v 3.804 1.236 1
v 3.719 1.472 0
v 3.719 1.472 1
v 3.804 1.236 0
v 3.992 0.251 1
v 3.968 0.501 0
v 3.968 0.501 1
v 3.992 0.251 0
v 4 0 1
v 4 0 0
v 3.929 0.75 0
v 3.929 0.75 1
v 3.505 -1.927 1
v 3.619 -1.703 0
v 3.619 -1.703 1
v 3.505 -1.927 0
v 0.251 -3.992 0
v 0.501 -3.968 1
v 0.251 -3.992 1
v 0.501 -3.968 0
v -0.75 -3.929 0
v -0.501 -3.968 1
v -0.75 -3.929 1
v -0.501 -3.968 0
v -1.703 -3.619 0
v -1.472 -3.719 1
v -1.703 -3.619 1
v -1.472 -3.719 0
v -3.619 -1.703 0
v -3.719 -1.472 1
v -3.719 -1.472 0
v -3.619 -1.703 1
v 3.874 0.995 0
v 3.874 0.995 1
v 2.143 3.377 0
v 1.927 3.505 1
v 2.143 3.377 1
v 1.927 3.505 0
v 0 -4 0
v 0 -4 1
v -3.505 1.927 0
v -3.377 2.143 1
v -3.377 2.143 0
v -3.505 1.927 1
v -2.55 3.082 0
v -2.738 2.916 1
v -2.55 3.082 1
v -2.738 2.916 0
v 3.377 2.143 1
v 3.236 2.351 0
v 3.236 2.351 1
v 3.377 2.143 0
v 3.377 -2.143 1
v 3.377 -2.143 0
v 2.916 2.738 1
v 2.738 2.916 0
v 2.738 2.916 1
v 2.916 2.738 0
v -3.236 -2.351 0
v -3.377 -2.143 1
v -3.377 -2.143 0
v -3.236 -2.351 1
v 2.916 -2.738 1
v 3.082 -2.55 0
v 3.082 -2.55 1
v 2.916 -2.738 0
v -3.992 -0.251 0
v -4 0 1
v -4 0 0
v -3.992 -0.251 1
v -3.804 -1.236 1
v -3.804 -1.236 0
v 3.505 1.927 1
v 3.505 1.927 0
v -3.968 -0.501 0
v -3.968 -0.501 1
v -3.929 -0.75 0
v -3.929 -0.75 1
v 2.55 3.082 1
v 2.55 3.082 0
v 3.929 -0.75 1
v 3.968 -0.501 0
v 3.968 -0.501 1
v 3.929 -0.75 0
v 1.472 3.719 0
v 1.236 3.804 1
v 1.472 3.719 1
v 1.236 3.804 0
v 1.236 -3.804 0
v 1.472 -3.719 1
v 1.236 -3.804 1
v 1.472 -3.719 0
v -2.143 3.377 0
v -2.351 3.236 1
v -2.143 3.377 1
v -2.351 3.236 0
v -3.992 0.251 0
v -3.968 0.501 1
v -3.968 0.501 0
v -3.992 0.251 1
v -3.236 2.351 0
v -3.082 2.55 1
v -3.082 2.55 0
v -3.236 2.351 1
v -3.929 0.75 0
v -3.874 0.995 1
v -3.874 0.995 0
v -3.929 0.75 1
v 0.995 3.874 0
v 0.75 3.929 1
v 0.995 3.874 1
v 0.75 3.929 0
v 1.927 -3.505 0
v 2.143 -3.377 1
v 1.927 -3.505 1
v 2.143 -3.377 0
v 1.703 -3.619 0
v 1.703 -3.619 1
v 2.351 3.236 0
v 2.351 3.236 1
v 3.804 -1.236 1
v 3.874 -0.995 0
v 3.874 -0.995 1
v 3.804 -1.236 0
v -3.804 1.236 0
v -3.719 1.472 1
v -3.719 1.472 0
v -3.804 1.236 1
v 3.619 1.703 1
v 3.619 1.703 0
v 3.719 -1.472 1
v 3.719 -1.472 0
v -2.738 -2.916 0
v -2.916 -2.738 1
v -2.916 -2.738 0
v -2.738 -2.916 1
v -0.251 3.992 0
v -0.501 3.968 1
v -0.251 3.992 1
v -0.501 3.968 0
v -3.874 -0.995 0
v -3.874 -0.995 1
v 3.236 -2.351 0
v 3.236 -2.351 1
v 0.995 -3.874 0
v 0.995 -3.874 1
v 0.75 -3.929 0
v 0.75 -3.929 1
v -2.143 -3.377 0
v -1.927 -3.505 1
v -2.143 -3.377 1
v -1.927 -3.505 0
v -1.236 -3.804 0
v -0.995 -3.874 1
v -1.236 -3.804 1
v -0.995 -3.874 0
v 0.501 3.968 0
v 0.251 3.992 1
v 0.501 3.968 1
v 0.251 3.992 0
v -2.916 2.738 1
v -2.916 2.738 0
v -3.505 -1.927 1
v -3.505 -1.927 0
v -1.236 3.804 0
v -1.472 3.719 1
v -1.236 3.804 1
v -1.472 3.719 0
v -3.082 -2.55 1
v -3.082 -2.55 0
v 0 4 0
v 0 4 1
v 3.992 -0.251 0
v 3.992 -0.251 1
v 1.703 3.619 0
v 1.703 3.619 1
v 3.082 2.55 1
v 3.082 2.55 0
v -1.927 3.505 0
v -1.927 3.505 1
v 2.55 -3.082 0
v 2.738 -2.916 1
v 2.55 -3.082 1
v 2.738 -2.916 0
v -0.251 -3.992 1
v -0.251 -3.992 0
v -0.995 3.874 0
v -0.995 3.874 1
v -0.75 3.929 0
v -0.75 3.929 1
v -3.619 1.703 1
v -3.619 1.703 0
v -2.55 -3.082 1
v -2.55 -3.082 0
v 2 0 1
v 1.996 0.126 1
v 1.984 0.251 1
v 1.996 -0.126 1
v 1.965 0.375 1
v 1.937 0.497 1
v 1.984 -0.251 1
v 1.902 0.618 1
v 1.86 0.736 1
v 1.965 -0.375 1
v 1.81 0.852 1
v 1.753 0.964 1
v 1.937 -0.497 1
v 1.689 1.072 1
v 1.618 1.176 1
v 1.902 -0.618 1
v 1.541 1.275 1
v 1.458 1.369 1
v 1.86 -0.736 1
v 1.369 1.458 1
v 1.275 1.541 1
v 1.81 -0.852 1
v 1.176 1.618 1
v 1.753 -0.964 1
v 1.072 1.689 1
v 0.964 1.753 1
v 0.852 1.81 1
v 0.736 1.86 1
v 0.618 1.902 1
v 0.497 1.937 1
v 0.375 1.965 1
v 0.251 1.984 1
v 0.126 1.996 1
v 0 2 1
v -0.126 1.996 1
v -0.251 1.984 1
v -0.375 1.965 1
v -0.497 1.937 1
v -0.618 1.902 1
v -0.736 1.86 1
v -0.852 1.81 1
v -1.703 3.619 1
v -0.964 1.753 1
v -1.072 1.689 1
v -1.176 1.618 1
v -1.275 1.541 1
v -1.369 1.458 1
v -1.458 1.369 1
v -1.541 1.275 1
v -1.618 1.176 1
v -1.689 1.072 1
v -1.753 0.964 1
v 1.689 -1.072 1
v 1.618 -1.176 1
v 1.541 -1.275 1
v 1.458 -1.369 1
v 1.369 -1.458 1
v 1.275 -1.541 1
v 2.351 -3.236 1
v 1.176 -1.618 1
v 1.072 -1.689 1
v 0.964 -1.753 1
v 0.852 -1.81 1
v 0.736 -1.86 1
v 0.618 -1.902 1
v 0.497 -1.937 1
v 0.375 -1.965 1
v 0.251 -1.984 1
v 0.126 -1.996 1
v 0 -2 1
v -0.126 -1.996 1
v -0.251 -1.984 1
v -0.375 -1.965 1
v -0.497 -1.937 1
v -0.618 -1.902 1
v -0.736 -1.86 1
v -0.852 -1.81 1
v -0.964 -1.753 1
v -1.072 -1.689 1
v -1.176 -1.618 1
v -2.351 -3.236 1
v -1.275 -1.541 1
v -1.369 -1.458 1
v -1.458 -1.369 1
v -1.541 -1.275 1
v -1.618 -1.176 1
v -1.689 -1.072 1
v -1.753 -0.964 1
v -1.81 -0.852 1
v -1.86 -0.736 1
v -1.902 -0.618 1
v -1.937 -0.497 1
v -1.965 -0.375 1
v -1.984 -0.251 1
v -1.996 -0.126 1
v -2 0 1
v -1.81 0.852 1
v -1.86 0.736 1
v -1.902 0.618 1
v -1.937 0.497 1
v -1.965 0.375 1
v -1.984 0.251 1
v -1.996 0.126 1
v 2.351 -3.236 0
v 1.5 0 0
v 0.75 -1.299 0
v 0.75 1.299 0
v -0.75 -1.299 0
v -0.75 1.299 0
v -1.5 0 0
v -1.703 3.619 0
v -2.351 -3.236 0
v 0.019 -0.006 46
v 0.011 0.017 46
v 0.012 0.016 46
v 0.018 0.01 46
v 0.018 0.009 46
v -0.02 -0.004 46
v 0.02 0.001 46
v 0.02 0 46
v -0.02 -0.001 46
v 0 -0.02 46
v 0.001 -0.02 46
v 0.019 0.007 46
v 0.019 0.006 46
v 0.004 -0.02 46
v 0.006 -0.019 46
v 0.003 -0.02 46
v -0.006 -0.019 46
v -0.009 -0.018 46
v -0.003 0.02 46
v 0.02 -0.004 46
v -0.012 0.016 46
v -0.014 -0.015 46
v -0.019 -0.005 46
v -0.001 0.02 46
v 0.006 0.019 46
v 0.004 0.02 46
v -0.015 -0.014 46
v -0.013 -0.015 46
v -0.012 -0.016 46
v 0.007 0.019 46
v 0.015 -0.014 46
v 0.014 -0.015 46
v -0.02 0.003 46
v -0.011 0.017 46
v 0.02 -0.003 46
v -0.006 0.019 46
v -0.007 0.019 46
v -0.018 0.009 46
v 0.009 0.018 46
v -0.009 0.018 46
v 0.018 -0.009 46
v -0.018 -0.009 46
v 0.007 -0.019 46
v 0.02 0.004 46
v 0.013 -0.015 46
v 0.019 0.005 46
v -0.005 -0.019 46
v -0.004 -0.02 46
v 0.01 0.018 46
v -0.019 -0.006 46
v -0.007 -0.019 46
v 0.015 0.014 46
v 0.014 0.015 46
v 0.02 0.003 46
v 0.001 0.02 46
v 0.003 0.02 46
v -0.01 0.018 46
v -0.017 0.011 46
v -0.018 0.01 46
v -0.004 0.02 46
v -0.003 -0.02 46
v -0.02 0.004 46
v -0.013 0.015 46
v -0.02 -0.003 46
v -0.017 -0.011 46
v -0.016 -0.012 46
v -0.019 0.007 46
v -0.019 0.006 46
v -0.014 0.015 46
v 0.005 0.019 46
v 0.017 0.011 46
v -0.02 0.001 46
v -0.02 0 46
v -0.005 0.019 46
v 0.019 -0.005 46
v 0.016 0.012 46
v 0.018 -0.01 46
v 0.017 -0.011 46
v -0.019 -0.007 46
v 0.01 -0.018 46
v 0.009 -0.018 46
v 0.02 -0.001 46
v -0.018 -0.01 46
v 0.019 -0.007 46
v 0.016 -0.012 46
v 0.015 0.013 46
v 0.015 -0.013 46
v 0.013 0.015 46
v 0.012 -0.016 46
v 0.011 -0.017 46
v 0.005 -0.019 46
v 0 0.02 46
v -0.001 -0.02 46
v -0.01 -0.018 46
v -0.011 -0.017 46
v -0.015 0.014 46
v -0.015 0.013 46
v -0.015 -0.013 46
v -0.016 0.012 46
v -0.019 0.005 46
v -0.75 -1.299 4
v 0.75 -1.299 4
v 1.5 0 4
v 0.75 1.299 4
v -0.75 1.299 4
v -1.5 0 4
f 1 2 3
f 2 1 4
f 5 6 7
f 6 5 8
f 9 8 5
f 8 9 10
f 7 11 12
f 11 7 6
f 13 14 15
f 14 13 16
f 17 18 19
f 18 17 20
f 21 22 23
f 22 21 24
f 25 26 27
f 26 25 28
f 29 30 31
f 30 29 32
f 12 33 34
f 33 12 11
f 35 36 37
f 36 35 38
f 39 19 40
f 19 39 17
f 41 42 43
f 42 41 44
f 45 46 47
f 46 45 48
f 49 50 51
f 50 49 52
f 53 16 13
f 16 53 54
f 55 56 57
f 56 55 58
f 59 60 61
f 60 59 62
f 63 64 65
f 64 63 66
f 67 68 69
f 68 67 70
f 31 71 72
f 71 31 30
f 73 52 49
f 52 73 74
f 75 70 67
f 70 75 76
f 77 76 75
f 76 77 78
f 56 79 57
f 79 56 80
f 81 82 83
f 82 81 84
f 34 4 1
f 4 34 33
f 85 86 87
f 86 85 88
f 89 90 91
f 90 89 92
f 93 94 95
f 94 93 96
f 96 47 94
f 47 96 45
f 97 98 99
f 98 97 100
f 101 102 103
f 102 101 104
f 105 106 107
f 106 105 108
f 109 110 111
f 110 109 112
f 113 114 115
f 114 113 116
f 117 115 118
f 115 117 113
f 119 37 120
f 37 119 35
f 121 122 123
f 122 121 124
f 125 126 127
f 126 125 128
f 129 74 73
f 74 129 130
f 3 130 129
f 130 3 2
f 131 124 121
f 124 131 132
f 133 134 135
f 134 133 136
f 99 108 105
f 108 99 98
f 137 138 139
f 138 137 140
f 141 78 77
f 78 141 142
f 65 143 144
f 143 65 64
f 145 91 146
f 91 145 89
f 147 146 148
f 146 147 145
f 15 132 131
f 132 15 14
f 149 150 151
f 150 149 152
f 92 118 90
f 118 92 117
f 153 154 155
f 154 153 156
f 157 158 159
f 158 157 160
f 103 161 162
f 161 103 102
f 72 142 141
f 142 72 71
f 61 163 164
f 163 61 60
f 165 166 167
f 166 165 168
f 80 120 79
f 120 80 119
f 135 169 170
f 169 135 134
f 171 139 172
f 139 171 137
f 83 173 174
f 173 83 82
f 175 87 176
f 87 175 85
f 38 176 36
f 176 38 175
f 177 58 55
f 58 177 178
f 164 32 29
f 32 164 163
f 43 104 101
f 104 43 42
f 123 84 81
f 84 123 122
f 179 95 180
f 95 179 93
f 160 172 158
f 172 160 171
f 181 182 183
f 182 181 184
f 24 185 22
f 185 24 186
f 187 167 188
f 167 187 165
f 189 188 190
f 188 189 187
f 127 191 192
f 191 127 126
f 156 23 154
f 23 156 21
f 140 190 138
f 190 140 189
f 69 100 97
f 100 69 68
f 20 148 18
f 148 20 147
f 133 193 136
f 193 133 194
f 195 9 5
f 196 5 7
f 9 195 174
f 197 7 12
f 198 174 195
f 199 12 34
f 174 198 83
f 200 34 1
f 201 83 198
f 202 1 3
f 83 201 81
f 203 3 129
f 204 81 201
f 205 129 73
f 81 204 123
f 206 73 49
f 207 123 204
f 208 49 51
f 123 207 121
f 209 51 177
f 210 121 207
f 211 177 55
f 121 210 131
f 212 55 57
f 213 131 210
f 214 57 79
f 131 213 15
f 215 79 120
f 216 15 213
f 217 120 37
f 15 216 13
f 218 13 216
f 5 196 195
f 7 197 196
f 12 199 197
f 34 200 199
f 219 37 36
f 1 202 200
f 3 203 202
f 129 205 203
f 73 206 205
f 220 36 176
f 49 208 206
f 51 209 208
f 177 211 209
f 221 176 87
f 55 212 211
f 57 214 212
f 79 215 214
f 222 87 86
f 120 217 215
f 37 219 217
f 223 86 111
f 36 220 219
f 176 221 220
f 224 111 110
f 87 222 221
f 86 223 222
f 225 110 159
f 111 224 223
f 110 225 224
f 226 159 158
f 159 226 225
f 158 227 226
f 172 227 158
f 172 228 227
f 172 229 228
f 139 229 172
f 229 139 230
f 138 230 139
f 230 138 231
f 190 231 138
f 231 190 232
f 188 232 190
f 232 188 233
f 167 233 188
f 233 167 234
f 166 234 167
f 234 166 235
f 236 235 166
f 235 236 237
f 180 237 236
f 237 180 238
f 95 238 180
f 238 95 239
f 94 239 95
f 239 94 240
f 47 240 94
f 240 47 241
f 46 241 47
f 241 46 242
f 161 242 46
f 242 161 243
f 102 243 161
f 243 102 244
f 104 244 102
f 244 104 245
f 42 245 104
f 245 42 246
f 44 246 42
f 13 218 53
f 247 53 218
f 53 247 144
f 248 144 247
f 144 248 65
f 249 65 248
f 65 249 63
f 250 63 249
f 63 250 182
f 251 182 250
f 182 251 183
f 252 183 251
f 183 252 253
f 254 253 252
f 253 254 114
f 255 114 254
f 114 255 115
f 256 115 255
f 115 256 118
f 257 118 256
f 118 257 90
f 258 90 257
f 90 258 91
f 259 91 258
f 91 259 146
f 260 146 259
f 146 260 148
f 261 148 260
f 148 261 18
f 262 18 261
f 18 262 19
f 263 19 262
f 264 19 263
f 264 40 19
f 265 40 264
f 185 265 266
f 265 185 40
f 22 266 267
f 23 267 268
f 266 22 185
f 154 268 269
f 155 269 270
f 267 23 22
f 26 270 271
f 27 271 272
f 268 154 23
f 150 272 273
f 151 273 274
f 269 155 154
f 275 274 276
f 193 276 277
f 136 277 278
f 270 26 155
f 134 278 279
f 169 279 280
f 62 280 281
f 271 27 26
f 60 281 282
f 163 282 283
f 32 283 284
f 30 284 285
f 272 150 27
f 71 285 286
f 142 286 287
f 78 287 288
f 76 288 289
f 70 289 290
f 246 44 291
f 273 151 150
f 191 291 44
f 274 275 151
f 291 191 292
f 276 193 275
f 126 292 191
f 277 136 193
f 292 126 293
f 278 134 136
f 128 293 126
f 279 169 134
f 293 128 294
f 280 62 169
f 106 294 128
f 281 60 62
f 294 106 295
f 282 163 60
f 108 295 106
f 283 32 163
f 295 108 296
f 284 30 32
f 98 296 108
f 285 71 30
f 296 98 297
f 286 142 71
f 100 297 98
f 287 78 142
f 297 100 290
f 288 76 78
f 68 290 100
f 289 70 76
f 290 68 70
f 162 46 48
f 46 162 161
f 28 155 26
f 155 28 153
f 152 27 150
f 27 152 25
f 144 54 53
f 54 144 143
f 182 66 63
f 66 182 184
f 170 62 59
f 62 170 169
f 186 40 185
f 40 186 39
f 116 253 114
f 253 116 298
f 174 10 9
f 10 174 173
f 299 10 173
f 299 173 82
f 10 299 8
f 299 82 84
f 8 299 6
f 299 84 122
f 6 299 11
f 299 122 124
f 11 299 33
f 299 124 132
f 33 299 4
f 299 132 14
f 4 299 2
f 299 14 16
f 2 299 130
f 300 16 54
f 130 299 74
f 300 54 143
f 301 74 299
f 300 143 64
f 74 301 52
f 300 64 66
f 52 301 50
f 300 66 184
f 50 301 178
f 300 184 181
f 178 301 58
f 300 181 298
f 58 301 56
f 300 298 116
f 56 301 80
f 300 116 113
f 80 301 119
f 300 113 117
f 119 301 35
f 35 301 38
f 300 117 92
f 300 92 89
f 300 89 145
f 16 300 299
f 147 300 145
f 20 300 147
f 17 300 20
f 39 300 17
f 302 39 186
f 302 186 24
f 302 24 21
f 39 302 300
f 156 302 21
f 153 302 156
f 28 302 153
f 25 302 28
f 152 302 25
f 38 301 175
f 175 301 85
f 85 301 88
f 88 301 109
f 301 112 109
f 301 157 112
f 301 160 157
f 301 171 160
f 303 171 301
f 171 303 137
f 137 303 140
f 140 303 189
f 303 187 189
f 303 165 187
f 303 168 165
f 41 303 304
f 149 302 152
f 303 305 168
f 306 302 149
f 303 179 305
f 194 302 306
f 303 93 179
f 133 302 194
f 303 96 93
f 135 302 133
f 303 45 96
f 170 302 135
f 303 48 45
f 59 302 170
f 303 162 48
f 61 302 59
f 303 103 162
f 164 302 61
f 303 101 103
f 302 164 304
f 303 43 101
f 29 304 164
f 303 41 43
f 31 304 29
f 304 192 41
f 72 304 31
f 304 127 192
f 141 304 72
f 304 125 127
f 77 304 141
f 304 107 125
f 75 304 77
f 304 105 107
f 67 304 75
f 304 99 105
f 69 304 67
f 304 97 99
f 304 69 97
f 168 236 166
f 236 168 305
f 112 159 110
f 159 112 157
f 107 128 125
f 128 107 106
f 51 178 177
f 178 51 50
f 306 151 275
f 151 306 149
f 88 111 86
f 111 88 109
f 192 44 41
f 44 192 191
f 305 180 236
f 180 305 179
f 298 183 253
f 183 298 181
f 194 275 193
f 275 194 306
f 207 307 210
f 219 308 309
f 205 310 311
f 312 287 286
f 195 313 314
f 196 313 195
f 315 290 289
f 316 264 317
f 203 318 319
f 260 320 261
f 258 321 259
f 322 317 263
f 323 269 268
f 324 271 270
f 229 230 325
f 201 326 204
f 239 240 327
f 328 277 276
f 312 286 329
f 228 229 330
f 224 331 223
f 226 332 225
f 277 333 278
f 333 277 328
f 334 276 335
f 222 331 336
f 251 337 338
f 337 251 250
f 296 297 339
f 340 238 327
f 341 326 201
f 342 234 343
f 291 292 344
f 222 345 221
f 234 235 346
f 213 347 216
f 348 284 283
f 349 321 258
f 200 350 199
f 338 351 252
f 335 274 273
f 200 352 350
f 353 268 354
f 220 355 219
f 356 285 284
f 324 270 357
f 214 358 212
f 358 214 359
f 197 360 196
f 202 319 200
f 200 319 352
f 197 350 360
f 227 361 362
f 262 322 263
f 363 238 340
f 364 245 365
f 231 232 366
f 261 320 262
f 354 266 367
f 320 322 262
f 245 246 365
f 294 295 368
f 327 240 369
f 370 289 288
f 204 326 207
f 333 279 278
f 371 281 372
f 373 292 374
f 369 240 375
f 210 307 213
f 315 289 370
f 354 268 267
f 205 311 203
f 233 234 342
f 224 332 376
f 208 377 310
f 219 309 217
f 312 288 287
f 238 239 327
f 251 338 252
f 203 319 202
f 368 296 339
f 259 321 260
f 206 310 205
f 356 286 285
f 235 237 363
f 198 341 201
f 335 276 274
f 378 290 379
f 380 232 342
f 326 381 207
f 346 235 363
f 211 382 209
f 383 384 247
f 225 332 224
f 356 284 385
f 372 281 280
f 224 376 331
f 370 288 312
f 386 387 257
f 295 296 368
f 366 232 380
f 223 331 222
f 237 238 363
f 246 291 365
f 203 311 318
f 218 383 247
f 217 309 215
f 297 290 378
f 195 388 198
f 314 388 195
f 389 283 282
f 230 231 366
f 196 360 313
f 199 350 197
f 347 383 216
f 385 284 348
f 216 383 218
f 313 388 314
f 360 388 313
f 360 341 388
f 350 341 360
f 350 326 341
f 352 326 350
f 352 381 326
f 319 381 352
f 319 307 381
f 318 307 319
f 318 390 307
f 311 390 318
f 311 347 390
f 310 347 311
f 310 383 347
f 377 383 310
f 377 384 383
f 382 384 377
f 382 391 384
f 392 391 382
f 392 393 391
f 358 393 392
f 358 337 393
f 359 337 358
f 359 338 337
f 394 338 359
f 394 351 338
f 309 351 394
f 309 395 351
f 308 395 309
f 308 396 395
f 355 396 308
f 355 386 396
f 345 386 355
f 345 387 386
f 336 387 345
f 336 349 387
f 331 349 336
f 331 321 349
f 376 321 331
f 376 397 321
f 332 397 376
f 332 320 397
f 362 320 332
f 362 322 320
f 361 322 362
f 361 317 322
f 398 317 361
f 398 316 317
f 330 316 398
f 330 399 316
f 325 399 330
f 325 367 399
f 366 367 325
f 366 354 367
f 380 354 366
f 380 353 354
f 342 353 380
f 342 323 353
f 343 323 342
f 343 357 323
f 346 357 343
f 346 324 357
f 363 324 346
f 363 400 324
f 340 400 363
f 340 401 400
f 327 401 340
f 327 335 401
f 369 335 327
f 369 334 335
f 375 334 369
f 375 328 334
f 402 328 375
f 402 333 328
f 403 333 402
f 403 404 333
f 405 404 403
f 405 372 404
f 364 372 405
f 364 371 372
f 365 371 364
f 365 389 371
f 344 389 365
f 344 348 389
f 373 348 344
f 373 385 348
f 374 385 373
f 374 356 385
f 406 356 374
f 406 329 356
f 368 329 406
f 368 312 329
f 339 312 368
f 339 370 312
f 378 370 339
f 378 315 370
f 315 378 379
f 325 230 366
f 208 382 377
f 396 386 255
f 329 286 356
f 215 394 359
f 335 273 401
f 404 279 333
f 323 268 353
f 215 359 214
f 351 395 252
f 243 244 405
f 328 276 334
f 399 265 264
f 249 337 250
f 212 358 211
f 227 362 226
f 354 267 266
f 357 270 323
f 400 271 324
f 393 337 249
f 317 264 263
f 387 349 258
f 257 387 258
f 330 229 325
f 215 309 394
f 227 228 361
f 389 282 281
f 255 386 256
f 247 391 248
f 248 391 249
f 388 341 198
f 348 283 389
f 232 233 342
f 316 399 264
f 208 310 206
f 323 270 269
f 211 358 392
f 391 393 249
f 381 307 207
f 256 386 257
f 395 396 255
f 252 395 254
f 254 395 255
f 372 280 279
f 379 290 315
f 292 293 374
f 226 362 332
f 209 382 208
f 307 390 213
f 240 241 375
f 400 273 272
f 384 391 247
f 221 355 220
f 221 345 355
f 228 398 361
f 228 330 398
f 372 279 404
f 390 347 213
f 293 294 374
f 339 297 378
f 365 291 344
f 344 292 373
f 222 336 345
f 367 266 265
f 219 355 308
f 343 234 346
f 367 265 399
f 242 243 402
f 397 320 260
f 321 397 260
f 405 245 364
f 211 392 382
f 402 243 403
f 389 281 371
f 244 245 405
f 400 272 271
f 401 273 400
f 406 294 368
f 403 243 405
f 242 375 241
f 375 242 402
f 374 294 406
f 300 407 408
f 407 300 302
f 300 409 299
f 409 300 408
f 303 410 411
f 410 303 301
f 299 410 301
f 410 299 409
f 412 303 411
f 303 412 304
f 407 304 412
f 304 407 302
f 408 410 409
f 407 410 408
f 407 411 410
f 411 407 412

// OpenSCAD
foam_thickness = 50;
bracket_width = 2;

// ROUNDNESS
$fn = 100;

head_h = bracket_width / 2;
head_r = 4;

shaft_h = foam_thickness * .9;
shaft_start_r = 2;
shaft_end_r = .02;

socket_h = bracket_width * 2;
socket_r = shaft_start_r * .75;

// OBJECT
difference() {
    union() {
        // SCREW HEAD
        cylinder(h=head_h, r=head_r);
        // SCREW SHAFT
        translate([0, 0, head_h]) {
            cylinder(shaft_h, shaft_start_r, shaft_end_r);
        }        
    }
    cylinder(h=socket_h, r=socket_r, $fn=6);
}
